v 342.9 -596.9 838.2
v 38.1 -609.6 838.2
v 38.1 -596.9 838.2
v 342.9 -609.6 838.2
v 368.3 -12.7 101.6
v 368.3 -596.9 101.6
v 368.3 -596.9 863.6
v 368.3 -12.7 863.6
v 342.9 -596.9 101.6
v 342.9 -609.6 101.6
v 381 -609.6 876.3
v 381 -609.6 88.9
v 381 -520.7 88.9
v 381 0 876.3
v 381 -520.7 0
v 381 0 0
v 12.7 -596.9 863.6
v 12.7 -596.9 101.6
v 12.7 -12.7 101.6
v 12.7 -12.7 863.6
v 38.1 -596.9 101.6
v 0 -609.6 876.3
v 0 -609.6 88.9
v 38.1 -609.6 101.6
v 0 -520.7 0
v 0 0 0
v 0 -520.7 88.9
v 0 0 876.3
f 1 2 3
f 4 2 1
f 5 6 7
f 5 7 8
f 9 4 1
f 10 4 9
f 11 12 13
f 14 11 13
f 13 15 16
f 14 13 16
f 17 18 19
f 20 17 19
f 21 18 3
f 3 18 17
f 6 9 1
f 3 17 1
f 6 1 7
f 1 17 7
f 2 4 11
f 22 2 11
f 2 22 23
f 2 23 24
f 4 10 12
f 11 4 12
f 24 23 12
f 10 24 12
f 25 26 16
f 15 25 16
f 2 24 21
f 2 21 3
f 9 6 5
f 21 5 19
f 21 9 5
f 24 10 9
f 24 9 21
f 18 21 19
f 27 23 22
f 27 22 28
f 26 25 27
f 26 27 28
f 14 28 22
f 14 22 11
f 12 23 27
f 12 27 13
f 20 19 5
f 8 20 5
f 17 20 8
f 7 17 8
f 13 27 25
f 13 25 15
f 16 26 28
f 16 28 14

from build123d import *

# Parameters (mm, degrees)
F0_W     = 381
F0_H     = 609.6
F1_DEPTH = 876.3
F2_W     = 381
F2_H     = 88.9
F3_DEPTH = 88.9
F4_T     = -12.7
F5_DEPTH = 88.9
F6_W     = 381
F6_H     = 787.4
F7_DEPTH = 12.7


with BuildPart() as f1:
    # F0 (on Top) → F1 (new body)
    with BuildSketch(Plane.XY):
        with Locations((190.5, -304.8)):
            Rectangle(F0_W, F0_H)
    extrude(amount=F1_DEPTH)

    # F2 (on face) → F3 (cut)
    with BuildSketch(Plane.XZ.offset(609.6)):
        with Locations((190.5, 44.45)):
            Rectangle(F2_W, F2_H)
    extrude(amount=-F3_DEPTH, mode=Mode.SUBTRACT)

    # F4
    f4_openings = [f1.faces().sort_by_distance(p)[0] for p in [
        (190.5, -609.6, 482.6),
    ]]
    offset(amount=F4_T, openings=f4_openings, kind=Kind.INTERSECTION)

    # F5 (add, through all): a face of the model
    f5_faces = [f1.faces().sort_by_distance(p)[0] for p in [
        (190.5, -260.35, 12.7),
    ]]
    extrude(f5_faces, amount=F5_DEPTH)

    # F6 (on face) → F7 (join)
    with BuildSketch(Plane.XZ.offset(609.6)):
        with Locations((190.5, 482.6)):
            Rectangle(F6_W, F6_H)
        Polygon((342.9, 101.6), (38.1, 101.6), (12.7, 101.6), (12.7, 863.6), (368.3, 863.6), (368.3, 101.6), align=None, mode=Mode.SUBTRACT)
        Polygon((38.1, 101.6), (38.1, 838.2), (342.9, 838.2), (342.9, 101.6), (368.3, 101.6), (368.3, 863.6), (12.7, 863.6), (12.7, 101.6), align=None)
    extrude(amount=-F7_DEPTH)


solid = f1.part
